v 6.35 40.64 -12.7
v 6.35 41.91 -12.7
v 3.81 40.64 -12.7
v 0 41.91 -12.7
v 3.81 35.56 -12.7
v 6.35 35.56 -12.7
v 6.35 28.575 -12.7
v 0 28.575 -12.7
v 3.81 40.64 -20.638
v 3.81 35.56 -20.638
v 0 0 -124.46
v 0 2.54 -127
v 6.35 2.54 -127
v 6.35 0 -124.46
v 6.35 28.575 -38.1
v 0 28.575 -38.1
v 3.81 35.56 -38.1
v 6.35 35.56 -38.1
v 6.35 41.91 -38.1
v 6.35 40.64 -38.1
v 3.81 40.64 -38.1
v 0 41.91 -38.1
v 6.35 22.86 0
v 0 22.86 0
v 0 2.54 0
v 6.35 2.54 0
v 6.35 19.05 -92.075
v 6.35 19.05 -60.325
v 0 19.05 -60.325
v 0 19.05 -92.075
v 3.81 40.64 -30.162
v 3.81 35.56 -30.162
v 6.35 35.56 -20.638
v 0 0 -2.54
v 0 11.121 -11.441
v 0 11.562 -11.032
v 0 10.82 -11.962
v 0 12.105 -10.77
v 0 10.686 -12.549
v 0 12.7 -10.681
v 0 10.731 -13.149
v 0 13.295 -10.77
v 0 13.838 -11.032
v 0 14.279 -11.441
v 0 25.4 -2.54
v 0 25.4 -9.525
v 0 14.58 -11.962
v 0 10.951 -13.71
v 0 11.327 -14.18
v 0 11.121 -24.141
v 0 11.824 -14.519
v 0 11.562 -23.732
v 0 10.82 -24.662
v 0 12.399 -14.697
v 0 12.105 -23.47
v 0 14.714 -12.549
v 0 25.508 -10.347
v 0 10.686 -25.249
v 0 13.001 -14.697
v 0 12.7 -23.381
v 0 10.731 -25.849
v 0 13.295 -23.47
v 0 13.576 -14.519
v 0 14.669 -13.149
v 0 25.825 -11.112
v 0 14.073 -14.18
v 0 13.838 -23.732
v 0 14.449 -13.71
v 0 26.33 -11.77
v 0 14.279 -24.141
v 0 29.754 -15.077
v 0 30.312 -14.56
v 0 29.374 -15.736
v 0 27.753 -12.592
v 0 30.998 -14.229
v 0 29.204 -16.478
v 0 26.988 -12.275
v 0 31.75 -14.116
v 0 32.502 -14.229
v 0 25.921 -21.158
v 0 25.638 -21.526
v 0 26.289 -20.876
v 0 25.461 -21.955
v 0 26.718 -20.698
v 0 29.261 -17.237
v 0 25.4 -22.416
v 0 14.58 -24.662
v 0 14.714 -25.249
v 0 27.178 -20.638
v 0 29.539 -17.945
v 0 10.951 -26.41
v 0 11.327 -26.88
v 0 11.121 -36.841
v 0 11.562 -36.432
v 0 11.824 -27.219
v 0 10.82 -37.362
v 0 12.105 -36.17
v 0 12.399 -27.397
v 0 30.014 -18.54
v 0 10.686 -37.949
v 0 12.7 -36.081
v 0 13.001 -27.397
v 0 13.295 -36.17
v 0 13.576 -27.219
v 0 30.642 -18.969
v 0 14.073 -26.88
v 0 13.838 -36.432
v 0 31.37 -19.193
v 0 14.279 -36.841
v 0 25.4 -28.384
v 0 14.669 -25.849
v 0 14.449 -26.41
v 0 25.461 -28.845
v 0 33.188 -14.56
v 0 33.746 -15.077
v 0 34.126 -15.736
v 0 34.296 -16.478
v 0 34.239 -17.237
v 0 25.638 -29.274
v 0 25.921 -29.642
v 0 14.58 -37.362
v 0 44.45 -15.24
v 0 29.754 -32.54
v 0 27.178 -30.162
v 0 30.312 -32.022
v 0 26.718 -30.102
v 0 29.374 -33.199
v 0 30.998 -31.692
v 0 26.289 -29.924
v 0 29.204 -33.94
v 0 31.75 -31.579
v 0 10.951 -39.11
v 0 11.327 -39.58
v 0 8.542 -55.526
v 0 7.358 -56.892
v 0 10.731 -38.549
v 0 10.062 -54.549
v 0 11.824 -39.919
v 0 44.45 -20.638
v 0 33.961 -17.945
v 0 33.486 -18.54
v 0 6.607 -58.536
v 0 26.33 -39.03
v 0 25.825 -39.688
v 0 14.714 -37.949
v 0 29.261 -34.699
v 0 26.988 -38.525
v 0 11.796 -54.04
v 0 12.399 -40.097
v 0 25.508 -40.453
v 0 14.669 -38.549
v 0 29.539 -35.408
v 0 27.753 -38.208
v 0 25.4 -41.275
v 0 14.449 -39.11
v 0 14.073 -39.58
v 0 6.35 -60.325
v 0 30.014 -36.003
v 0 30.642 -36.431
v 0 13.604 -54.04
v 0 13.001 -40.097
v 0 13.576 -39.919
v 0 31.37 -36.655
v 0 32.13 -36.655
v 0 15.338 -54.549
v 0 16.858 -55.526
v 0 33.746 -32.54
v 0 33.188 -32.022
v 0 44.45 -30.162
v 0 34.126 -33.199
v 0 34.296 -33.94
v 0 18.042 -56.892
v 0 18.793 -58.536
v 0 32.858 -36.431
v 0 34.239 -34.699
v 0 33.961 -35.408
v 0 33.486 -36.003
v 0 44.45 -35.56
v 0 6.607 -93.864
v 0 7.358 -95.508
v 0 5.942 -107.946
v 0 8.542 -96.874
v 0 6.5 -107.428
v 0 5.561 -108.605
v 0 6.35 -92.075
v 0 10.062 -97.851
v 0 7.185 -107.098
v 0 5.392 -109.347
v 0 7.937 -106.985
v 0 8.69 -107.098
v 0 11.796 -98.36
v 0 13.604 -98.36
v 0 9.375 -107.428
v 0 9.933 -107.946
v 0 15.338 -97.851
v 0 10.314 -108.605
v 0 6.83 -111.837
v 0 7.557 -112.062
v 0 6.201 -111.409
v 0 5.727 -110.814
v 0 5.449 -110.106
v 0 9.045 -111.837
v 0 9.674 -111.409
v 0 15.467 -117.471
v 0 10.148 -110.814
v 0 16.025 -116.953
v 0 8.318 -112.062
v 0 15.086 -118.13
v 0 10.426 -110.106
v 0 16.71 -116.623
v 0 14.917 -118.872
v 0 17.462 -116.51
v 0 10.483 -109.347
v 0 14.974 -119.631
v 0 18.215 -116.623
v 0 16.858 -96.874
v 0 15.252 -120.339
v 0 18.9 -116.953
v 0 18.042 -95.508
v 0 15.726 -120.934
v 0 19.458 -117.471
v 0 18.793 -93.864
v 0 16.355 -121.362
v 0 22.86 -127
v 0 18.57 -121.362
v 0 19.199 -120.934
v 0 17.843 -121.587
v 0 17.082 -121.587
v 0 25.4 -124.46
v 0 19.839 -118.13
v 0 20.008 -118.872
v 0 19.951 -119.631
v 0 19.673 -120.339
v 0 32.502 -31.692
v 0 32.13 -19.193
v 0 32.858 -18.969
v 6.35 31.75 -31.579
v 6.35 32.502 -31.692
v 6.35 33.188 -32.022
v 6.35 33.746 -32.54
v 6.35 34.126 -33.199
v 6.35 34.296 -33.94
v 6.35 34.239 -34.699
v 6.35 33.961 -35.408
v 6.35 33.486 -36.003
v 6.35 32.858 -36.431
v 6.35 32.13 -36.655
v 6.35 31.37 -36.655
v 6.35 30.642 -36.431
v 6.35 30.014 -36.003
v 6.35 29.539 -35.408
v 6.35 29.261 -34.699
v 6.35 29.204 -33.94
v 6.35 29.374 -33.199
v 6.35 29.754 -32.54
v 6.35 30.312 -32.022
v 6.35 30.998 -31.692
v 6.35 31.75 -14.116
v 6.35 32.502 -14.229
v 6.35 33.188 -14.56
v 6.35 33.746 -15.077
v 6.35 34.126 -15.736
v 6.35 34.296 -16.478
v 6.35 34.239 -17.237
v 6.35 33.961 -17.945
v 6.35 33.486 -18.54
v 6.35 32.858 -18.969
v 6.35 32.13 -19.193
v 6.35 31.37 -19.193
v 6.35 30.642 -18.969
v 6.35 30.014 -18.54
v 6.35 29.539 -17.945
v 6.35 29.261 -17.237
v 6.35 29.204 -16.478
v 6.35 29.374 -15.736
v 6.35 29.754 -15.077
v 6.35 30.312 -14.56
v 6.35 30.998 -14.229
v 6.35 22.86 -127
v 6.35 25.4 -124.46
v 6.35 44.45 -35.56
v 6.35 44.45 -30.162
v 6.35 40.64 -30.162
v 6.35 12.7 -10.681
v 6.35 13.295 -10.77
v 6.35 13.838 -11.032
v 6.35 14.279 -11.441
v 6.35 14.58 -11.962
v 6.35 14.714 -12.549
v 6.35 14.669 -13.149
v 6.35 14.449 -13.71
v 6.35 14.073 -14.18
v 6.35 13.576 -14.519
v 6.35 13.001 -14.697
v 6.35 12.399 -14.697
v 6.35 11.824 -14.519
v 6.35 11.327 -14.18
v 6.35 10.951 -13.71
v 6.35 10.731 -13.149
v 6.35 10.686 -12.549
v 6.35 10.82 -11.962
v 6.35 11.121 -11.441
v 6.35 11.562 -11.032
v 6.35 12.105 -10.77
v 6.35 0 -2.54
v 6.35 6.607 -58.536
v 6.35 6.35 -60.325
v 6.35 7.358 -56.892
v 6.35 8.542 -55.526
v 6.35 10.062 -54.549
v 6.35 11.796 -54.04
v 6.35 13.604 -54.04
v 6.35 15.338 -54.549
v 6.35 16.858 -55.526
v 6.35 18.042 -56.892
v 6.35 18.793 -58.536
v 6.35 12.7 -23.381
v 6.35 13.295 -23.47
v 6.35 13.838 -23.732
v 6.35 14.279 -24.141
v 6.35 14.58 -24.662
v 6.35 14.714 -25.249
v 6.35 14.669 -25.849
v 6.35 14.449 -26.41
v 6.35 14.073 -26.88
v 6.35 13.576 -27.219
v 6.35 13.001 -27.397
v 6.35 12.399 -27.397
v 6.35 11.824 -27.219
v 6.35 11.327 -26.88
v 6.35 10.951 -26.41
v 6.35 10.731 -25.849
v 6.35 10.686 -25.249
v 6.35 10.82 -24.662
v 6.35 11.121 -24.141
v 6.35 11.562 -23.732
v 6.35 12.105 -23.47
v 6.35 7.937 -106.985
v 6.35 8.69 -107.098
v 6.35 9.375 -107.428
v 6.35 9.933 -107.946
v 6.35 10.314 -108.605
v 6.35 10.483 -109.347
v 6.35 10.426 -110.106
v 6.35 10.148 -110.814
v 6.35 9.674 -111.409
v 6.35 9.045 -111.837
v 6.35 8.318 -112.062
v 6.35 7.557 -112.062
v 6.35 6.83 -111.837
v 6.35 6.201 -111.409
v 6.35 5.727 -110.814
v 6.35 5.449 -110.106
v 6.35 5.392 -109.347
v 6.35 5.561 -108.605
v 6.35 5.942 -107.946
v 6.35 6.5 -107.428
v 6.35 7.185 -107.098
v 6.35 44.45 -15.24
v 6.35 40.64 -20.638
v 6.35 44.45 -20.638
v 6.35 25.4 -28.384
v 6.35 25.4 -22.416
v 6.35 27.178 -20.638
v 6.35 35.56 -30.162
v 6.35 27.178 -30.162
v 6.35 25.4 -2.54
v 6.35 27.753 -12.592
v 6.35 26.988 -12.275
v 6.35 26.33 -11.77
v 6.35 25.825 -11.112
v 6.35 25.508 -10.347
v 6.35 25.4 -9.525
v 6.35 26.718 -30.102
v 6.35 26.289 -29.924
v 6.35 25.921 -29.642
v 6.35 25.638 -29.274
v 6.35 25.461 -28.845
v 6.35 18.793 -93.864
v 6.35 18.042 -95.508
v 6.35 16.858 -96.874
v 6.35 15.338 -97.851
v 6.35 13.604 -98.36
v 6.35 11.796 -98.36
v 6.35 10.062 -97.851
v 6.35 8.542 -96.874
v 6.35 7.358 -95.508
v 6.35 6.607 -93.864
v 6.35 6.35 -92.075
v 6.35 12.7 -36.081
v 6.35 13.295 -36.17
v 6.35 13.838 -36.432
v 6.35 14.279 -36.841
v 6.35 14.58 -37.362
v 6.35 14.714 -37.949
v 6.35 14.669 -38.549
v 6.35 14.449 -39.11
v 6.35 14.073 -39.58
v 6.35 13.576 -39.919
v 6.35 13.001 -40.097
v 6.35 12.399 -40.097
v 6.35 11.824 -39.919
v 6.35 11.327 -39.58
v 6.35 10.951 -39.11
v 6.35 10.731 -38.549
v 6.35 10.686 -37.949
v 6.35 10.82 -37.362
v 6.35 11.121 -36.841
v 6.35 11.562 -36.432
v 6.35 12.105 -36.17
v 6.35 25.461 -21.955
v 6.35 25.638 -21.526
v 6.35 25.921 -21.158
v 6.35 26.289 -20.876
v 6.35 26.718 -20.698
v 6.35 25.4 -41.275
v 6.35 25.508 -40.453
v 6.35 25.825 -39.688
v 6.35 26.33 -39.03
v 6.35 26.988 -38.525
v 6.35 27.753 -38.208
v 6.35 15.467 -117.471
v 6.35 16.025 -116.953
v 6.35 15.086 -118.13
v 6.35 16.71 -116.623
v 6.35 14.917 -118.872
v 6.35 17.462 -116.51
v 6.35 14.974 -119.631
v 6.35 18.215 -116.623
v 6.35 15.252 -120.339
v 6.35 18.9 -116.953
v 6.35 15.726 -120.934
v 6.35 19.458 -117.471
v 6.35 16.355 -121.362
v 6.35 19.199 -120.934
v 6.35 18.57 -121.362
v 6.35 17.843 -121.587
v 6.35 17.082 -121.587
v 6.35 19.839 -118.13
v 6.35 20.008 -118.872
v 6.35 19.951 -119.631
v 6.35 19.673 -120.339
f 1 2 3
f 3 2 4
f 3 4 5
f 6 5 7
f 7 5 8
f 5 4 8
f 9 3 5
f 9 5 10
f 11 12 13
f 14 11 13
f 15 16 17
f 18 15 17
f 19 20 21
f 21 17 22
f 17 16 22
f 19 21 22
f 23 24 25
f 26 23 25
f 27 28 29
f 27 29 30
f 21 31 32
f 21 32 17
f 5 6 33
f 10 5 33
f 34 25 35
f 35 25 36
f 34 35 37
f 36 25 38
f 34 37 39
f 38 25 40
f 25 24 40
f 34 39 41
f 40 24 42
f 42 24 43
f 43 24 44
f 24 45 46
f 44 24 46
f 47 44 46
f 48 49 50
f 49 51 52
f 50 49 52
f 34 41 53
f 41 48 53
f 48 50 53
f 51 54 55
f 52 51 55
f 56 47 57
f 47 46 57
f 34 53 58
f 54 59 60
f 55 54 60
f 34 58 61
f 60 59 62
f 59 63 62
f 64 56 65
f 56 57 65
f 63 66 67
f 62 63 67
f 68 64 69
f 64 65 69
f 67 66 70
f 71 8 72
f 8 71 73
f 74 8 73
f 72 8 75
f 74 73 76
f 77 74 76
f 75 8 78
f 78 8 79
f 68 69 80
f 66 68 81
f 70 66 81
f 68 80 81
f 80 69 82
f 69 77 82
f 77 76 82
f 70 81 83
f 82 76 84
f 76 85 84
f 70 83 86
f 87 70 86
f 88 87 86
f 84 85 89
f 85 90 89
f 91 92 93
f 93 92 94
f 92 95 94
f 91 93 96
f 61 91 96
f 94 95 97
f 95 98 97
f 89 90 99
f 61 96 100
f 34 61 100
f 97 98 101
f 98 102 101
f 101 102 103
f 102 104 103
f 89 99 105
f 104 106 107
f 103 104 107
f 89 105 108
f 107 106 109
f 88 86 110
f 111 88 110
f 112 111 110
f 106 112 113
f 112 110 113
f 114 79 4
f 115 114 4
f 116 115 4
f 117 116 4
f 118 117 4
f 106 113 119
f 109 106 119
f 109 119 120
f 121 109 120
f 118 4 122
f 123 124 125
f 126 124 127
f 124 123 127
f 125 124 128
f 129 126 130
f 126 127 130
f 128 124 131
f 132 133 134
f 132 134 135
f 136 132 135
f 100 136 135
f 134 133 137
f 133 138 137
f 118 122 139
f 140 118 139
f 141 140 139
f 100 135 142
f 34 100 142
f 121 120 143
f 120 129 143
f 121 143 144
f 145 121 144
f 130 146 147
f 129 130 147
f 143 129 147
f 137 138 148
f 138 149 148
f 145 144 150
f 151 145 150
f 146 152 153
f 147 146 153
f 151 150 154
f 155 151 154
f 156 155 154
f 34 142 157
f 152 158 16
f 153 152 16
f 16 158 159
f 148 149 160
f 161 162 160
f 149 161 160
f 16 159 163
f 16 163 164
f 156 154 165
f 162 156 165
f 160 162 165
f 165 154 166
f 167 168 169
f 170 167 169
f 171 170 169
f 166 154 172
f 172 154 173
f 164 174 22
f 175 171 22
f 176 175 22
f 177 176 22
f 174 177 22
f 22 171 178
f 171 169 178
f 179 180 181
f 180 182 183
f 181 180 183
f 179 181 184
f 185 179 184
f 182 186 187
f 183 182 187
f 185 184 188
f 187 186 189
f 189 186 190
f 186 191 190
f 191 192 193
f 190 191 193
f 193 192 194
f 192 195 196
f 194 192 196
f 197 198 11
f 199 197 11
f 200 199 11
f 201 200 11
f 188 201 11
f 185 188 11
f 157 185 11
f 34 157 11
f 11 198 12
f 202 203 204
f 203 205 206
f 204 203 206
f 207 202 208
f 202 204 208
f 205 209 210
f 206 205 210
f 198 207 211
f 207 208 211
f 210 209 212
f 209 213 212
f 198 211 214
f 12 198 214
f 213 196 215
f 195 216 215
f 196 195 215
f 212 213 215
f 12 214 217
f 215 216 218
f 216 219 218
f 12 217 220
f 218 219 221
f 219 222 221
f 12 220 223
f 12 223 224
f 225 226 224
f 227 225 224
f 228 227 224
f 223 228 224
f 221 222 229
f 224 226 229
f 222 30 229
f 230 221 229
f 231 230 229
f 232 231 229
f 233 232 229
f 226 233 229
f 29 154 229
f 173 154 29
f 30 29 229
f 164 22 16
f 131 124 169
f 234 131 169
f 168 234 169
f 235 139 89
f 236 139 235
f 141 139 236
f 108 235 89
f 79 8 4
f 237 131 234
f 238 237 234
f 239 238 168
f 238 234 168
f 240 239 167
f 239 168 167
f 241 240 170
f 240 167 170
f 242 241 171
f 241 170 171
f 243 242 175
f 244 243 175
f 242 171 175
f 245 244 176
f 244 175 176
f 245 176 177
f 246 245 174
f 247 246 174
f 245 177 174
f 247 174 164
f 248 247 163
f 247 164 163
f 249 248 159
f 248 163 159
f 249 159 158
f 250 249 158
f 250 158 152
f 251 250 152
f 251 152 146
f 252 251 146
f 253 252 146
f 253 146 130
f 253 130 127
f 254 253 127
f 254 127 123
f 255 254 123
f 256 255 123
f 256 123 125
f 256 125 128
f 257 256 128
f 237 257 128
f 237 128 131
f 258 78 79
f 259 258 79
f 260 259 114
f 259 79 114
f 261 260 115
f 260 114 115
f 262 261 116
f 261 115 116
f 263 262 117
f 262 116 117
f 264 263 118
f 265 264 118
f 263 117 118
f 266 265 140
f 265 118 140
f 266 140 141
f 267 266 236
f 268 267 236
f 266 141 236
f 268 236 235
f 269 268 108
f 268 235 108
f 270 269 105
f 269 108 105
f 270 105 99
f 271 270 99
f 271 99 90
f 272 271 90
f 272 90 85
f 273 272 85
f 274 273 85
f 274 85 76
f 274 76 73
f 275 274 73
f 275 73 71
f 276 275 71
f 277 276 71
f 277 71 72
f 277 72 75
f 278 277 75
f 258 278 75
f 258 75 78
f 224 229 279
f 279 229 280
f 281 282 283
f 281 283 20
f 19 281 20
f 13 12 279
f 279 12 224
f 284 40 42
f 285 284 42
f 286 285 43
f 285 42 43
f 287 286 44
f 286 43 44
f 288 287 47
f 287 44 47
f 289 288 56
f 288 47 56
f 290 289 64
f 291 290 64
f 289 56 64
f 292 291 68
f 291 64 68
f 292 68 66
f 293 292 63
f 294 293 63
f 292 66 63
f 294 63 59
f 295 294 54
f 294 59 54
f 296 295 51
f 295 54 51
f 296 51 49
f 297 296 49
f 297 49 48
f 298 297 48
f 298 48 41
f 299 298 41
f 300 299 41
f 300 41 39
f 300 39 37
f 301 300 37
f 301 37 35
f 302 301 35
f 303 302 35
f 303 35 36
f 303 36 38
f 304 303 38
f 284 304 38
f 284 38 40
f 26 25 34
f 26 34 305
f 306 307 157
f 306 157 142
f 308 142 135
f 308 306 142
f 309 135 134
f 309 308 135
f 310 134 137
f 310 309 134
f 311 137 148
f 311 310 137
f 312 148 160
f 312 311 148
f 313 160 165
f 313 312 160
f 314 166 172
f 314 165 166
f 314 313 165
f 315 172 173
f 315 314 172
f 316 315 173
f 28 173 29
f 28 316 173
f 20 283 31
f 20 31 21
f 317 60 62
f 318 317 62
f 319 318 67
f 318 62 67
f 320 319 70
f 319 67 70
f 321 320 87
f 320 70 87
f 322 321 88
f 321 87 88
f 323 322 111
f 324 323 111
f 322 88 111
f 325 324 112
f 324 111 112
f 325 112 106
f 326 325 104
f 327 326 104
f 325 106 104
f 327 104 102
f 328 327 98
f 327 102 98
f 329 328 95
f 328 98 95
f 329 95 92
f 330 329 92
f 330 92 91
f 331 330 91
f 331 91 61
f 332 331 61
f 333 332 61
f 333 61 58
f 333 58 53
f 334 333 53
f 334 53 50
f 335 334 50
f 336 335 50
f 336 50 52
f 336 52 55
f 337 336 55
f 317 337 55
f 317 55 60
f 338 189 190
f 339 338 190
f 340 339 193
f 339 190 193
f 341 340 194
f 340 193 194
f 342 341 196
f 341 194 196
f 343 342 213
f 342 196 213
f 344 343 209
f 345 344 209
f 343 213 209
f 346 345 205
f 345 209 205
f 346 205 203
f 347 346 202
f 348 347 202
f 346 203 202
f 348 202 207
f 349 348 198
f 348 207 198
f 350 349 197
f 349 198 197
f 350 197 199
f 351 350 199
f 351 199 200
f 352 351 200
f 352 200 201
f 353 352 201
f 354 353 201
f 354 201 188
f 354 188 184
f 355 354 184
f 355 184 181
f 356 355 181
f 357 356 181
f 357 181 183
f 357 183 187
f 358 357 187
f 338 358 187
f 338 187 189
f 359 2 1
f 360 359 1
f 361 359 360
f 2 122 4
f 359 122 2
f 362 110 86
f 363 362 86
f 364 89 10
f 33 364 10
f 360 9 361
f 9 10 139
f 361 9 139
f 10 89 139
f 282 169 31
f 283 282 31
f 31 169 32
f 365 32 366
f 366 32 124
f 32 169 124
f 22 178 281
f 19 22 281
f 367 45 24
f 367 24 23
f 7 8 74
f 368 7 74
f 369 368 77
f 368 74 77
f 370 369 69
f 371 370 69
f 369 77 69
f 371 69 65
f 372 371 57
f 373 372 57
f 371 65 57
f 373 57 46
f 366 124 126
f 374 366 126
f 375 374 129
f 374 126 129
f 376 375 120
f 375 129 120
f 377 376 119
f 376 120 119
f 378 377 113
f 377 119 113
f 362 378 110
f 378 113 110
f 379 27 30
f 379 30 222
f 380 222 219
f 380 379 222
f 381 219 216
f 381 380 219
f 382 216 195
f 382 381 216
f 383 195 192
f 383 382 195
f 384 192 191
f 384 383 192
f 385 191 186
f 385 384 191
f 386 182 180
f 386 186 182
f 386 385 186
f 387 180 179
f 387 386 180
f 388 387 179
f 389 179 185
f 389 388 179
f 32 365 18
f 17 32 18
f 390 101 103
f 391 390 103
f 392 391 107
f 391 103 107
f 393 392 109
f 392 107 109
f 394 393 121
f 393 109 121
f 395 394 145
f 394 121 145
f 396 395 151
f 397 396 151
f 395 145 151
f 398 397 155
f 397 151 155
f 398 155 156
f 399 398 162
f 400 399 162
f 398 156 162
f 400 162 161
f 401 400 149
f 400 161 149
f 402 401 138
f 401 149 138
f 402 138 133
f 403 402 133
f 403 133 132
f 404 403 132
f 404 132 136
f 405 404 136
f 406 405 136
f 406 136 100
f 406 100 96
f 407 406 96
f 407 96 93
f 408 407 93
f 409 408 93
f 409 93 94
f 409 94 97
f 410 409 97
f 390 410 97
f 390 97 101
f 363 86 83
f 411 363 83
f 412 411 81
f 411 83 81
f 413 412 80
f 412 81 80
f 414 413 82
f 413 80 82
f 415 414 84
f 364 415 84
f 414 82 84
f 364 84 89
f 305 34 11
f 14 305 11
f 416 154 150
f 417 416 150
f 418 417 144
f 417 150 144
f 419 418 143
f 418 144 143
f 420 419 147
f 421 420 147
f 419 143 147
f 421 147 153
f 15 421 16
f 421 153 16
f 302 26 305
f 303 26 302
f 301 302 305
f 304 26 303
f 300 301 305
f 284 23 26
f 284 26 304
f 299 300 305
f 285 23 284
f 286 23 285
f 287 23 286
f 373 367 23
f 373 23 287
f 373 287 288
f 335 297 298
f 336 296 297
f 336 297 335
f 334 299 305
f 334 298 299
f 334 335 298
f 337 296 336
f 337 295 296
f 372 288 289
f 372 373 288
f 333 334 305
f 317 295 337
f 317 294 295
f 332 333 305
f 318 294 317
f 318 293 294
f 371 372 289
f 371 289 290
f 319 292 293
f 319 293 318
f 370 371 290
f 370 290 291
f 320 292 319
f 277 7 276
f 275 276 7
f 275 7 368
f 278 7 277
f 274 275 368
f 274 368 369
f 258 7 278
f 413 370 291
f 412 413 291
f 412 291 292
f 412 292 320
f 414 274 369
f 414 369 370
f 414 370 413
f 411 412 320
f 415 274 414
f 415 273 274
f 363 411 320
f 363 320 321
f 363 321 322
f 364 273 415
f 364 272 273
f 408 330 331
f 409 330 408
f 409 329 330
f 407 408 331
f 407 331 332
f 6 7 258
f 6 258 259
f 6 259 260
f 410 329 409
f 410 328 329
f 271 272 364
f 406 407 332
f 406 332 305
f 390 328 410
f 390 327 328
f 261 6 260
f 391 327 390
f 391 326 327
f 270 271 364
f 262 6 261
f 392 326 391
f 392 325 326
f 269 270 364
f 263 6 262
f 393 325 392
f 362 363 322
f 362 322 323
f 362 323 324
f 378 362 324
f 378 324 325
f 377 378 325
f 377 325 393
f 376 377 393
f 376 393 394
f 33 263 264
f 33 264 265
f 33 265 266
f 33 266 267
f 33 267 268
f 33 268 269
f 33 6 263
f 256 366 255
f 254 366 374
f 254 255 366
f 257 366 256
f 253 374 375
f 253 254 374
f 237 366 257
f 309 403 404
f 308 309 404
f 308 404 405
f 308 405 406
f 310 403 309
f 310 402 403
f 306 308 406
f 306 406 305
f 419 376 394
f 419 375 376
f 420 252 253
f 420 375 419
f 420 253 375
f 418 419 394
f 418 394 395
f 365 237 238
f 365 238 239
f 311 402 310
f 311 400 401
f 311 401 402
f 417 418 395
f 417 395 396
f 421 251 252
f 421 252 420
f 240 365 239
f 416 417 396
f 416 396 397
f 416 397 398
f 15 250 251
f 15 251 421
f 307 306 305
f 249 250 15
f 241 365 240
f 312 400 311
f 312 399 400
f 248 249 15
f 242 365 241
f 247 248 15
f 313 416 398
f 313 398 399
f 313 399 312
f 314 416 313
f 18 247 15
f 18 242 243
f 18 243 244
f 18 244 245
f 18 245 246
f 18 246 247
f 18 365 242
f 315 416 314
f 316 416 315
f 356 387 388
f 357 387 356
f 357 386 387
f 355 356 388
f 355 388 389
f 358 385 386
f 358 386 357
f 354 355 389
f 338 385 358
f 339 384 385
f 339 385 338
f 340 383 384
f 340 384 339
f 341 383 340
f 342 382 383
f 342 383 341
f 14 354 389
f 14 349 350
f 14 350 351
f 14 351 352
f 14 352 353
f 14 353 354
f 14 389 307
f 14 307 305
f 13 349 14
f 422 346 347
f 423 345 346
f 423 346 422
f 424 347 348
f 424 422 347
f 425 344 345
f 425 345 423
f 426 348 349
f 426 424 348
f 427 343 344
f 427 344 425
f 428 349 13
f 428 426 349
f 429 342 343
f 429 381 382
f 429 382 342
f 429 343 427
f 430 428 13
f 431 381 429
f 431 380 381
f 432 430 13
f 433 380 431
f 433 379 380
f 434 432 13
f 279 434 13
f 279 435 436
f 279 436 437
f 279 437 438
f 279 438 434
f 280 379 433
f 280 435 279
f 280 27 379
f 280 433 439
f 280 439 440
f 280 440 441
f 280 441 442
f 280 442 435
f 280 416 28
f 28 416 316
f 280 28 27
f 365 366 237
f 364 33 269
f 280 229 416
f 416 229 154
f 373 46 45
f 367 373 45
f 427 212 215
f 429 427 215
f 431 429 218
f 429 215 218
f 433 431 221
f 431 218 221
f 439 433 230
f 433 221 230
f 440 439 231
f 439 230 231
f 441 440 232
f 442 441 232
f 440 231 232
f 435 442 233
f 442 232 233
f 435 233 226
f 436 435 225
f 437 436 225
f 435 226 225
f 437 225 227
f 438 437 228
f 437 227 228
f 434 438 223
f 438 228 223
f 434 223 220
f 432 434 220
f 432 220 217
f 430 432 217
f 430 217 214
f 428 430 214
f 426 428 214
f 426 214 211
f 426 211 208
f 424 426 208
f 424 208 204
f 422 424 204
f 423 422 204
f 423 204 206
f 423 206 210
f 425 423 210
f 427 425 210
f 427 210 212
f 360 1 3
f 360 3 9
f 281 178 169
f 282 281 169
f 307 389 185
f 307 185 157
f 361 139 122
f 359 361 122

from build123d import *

# Parameters (mm, degrees)
BOSS_EXTRUDE1_DEPTH    = 6.35
F_10_32_TAPPED_HOLE1_D = 4.0386
F_10_CLEARANCE_HOLE1_D = 5.1054
SKETCH6_W              = 25.4
SKETCH6_H              = 5.08
CUT_EXTRUDE1_DEPTH     = 2.54
CHAMFER1_SIZE          = 2.54
CUT_EXTRUDE2_DEPTH     = 7.35


with BuildPart() as part:
    # Sketch1 → Boss-Extrude1 (new body)
    with BuildSketch(Plane(origin=(0, 0, 0), x_dir=(0, 0, -1), z_dir=(1, 0, 0))):
        with BuildLine():
            Line((0, 0), (127, 0))
            Line((127, 0), (127, 25.4))
            Line((127, 25.4), (41.275, 25.4))
            ThreePointArc((41.275, 25.4), (39.02993597, 26.32993597), (38.1, 28.575))
            Line((38.1, 28.575), (38.1, 44.45))
            Line((38.1, 44.45), (30.1625, 44.45))
            Line((30.1625, 44.45), (30.1625, 27.178))
            ThreePointArc((30.1625, 27.178), (29.641735857, 25.920764143), (28.3845, 25.4))
            Line((28.3845, 25.4), (22.4155, 25.4))
            ThreePointArc((22.4155, 25.4), (21.158264143, 25.920764143), (20.6375, 27.178))
            Line((20.6375, 27.178), (20.6375, 44.45))
            Line((20.6375, 44.45), (12.7, 44.45))
            Line((12.7, 44.45), (12.7, 28.575))
            ThreePointArc((12.7, 28.575), (11.77006403, 26.32993597), (9.525, 25.4))
            Line((9.525, 25.4), (0, 25.4))
            Line((0, 25.4), (0, 0))
        make_face()
    extrude(amount=BOSS_EXTRUDE1_DEPTH)

    # #10-32 Tapped Hole1 (through all)
    with Locations(Plane(origin=(6.35, 0, 0), x_dir=(0, 0, -1), z_dir=(1, 0, 0))):
        with Locations((12.7, 12.7), (25.4, 12.7), (38.1, 12.7)):
            Hole(F_10_32_TAPPED_HOLE1_D / 2)

    # #10 Clearance Hole1 (through all)
    with Locations(Plane(origin=(6.35, 0, 0), x_dir=(0, 0, -1), z_dir=(1, 0, 0))):
        with Locations((119.0625, 17.4625), (109.5375, 7.9375), (34.13125, 31.75), (16.66875, 31.75)):
            Hole(F_10_CLEARANCE_HOLE1_D / 2)

    # Sketch6 → Cut-Extrude1 (cut)
    with BuildSketch(Plane(origin=(6.35, 0, 0), x_dir=(0, 0, -1), z_dir=(1, 0, 0))):
        with Locations((25.4, 38.1)):
            Rectangle(SKETCH6_W, SKETCH6_H)
    extrude(amount=-CUT_EXTRUDE1_DEPTH, mode=Mode.SUBTRACT)

    # Chamfer1
    chamfer1_edges = [part.edges().sort_by_distance(p)[0] for p in [
        (3.175, 25.4, 0),
        (3.175, 44.45, -12.7),
        (3.175, 44.45, -38.1),
        (3.175, 25.4, -127),
        (3.175, 0, -127),
        (3.175, 0, 0),
    ]]
    chamfer(chamfer1_edges, length=CHAMFER1_SIZE)

    # Sketch7 → Cut-Extrude2 (cut, through all)
    with BuildSketch(Plane(origin=(6.35, 0, 0), x_dir=(0, 0, -1), z_dir=(1, 0, 0))):
        with BuildLine():
            Line((60.325, 19.05), (92.075, 19.05))
            ThreePointArc((92.075, 19.05), (98.425, 12.7), (92.075, 6.35))
            Line((92.075, 6.35), (60.325, 6.35))
            ThreePointArc((60.325, 6.35), (53.975, 12.7), (60.325, 19.05))
        make_face()
    extrude(amount=-CUT_EXTRUDE2_DEPTH, mode=Mode.SUBTRACT)


solid = part.part
